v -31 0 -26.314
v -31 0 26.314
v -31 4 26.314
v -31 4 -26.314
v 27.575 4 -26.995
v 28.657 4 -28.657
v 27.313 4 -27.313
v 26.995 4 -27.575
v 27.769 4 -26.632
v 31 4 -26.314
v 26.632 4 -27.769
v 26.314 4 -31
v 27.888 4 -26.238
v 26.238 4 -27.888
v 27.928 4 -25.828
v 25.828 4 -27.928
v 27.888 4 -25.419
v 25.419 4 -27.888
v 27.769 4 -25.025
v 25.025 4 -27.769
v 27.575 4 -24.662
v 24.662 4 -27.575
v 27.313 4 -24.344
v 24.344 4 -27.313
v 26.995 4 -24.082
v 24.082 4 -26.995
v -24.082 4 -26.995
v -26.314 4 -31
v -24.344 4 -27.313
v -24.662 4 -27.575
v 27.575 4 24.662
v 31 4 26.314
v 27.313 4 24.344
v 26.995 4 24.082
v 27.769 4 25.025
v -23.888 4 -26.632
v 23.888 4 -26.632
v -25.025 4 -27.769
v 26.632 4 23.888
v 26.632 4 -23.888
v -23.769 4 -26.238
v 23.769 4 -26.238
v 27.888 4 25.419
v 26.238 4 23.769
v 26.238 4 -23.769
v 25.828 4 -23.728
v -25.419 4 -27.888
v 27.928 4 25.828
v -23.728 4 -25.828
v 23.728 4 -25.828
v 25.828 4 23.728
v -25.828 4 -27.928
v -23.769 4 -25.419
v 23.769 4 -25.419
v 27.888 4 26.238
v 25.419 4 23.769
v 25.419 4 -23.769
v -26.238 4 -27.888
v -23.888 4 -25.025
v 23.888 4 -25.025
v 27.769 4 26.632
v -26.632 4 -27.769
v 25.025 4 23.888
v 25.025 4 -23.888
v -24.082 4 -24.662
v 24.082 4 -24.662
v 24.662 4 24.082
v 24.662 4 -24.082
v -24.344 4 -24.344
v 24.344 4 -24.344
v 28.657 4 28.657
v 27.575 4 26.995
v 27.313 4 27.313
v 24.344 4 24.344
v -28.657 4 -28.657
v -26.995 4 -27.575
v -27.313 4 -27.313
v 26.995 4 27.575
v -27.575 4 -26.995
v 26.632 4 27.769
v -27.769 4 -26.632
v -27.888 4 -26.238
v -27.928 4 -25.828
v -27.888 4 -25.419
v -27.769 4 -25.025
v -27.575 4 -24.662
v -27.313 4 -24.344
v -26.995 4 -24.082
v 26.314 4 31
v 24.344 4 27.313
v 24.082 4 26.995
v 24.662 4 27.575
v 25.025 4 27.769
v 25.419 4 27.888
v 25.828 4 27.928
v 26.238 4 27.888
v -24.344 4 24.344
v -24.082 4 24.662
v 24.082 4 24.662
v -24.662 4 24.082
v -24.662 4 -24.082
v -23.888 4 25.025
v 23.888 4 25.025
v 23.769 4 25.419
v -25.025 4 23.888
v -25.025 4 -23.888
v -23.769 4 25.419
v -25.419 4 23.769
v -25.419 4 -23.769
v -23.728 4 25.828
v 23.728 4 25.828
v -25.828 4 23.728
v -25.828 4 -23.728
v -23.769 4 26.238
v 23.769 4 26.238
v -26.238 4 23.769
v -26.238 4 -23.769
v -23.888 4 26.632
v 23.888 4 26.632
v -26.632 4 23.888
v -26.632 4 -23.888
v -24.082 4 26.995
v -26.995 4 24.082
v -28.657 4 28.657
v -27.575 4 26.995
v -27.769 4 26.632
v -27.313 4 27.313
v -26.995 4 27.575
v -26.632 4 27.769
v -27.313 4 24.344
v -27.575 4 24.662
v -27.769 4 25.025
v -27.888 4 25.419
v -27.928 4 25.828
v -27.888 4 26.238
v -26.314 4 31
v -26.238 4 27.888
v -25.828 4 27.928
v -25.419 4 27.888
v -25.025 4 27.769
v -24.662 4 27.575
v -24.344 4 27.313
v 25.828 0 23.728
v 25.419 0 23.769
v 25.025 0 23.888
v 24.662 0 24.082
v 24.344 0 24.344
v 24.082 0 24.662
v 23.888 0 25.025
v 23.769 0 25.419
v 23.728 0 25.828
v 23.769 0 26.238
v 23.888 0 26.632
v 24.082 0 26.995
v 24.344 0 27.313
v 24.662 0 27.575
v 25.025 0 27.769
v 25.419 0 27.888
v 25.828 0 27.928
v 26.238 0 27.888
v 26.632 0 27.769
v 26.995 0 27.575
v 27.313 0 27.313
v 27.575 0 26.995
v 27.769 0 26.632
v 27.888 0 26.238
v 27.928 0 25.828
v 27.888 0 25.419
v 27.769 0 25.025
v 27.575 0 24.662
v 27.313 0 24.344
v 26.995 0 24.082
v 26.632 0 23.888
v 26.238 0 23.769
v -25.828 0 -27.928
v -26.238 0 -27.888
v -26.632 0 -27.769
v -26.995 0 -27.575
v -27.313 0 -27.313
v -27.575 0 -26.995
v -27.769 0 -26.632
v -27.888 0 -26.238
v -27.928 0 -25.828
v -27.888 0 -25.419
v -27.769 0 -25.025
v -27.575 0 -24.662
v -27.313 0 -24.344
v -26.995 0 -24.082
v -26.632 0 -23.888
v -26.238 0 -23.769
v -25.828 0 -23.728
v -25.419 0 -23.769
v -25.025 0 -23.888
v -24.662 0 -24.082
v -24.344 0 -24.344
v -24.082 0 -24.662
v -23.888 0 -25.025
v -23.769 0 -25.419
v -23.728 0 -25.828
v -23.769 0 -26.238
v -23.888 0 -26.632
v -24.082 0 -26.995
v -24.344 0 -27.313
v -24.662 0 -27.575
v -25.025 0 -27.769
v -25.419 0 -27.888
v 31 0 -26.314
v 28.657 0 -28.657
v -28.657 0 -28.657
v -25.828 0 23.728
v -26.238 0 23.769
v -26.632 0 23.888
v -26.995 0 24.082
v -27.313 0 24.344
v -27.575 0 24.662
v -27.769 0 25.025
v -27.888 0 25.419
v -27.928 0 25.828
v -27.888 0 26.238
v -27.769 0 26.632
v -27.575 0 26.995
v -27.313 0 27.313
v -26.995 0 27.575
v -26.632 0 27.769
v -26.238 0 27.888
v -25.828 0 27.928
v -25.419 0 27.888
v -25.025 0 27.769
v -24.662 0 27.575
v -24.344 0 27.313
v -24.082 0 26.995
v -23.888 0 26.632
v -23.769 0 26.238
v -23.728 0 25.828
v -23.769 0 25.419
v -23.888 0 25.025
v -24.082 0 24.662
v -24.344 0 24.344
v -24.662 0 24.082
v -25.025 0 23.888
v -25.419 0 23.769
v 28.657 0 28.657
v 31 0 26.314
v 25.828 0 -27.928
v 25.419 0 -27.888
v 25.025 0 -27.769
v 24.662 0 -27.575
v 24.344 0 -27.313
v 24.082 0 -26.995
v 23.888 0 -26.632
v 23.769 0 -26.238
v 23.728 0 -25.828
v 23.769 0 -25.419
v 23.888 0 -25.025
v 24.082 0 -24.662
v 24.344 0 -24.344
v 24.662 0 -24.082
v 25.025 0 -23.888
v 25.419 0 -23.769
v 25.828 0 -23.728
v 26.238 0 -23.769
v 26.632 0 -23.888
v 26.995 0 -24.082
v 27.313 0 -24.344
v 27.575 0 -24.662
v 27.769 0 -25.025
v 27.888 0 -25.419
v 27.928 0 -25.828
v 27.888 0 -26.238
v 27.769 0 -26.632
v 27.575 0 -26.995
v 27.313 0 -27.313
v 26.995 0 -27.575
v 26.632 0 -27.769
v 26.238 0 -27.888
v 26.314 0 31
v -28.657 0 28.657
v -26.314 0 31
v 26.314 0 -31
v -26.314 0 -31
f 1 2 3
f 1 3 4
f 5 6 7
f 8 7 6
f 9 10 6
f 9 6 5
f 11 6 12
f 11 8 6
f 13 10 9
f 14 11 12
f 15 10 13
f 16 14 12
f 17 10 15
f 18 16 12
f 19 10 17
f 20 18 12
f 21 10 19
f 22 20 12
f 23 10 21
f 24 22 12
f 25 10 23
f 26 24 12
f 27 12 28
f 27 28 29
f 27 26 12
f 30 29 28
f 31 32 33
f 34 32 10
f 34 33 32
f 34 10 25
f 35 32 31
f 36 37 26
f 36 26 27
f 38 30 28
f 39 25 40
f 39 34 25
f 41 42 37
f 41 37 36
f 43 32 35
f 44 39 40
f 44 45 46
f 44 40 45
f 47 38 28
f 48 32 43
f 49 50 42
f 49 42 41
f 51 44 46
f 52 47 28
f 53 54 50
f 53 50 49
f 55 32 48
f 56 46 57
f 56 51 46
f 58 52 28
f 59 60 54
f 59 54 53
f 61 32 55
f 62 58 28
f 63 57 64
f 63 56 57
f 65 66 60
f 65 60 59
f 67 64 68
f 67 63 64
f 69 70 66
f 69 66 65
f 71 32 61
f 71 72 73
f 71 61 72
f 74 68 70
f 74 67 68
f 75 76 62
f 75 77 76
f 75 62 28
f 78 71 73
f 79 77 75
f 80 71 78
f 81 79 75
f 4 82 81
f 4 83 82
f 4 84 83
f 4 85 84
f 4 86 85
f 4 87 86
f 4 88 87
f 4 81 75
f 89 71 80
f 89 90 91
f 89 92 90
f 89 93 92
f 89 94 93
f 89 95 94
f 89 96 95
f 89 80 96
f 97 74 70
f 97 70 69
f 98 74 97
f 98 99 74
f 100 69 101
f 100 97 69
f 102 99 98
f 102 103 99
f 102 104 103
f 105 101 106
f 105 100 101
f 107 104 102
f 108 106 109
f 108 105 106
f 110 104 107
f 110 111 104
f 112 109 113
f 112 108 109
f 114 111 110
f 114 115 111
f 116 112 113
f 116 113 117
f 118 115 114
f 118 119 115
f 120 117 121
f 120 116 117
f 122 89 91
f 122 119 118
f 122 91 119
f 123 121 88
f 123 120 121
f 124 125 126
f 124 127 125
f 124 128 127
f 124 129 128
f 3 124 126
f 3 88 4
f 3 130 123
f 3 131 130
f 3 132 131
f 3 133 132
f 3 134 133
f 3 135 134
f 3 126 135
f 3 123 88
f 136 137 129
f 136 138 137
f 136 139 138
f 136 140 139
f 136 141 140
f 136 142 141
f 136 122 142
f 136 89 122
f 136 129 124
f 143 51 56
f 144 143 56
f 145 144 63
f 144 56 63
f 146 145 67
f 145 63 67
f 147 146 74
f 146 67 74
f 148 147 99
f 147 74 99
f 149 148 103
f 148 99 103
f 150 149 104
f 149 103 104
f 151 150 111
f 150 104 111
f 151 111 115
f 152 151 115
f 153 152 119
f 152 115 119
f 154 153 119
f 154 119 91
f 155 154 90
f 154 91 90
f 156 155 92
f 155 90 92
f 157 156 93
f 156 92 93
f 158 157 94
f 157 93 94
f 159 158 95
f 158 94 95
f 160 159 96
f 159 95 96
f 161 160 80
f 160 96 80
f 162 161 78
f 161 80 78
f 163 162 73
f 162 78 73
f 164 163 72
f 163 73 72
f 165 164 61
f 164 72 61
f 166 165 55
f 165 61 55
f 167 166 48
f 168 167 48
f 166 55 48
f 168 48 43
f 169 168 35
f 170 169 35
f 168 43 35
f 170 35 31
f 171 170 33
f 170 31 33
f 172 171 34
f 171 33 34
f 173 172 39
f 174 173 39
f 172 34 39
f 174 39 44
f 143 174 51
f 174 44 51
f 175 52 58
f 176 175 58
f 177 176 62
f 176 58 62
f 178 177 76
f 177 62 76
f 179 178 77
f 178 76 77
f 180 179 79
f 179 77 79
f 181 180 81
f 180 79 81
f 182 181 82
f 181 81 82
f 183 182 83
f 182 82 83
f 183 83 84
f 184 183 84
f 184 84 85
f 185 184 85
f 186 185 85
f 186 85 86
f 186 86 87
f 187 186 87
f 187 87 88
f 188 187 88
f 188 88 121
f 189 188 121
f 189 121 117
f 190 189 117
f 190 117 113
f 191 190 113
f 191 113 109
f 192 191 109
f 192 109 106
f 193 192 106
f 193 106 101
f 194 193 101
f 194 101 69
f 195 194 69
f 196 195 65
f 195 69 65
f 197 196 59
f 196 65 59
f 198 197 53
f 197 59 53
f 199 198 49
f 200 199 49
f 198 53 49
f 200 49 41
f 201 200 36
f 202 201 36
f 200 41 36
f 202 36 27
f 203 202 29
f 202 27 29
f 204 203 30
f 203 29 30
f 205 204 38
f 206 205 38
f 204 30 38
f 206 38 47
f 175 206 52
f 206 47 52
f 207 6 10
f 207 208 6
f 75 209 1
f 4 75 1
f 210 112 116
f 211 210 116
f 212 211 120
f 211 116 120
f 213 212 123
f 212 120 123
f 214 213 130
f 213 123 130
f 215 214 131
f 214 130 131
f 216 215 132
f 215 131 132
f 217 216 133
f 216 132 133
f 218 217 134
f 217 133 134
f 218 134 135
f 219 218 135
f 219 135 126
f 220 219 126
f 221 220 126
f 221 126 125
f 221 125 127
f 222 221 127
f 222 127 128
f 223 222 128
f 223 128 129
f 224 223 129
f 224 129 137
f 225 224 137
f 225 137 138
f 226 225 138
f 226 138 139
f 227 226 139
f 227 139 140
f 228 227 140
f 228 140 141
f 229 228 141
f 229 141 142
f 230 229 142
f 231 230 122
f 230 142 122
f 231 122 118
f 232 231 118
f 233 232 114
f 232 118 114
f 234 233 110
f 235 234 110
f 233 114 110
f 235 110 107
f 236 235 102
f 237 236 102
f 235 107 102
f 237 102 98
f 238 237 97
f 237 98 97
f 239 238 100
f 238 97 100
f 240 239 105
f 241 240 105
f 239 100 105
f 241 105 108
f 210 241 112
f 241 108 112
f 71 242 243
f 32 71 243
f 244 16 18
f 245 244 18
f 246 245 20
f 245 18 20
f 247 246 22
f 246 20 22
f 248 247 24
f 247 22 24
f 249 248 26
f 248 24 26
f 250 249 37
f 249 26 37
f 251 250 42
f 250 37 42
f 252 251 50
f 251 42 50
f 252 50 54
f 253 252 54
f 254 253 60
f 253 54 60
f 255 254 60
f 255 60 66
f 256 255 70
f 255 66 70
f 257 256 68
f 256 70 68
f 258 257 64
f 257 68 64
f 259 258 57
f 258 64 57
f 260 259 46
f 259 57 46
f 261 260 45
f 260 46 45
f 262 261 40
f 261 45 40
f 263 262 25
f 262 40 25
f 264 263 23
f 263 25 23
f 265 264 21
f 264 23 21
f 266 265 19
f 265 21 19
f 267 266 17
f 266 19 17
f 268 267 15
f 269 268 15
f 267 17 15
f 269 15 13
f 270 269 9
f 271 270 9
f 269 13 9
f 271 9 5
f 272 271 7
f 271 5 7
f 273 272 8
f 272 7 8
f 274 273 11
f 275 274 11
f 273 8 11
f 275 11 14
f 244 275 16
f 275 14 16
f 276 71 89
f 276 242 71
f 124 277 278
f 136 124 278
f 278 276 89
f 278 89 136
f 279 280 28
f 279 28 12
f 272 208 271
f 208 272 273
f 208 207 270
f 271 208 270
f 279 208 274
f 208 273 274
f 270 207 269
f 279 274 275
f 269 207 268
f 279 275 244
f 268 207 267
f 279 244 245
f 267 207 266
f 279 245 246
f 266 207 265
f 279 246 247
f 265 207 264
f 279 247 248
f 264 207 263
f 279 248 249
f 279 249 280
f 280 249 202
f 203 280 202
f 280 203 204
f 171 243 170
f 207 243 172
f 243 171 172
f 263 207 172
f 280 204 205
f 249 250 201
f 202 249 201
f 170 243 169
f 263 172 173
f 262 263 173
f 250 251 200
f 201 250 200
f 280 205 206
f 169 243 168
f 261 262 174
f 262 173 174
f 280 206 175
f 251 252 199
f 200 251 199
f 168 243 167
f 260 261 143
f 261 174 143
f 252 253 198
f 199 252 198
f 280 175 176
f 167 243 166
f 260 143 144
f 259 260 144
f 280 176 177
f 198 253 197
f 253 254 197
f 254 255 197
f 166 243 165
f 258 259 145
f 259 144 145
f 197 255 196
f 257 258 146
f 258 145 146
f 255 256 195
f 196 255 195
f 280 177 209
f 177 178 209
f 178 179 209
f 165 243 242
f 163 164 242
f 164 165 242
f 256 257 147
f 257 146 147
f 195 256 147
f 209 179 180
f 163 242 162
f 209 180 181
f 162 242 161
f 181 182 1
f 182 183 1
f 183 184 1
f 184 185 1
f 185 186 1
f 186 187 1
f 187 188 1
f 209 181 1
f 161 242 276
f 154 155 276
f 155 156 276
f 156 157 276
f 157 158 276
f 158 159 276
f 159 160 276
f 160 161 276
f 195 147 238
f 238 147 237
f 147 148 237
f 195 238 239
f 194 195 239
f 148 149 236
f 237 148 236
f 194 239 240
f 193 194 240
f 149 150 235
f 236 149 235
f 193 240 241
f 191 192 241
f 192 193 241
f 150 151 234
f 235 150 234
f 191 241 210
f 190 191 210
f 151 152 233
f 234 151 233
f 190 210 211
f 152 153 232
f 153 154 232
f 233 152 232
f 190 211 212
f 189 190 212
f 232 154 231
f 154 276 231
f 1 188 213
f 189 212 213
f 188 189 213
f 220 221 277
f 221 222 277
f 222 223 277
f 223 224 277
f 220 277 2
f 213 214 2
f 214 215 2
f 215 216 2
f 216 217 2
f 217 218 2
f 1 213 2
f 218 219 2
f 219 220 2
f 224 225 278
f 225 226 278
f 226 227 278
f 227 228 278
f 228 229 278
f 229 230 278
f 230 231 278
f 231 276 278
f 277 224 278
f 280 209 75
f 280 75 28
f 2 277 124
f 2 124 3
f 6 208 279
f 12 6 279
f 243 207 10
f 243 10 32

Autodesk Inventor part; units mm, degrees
ref_plane "YZ Plane" through (0, 0, 0) normal (1, 0, 0) x (0, 1, 0)
ref_plane "XZ Plane" through (0, 0, 0) normal (0, 1, 0) x (-1, 0, 0)
ref_plane "XY Plane" through (0, 0, 0) normal (0, 0, 1) x (1, 0, 0)
sketch "Sketch1" plane through (0, 0, 0) normal (0, 1, 0) x (-1, 0, 0)
  line L0 (25.8285, 25.8285) -> (-25.8285, 25.8285) construction
  line L1 (-25.8285, 25.8285) -> (-25.8285, -25.8285) construction
  line L2 (-25.8285, -25.8285) -> (25.8285, -25.8285) construction
  line L3 (25.8285, -25.8285) -> (25.8285, 25.8285) construction
  line L4 (25.8285, 25.8285) -> (-25.8285, -25.8285) construction
  line L5 (-25.8285, 25.8285) -> (25.8285, -25.8285) construction
  line L6 (31, 26.3139) -> (31, -26.3139)
  line L7 (25.8285, -25.8285) -> (28.6569, -28.6569) construction
  line L8 (28.6569, -28.6569) -> (31, -26.3139)
  line L9 (0, 0) -> (14.4135, 0) construction
  line L10 (25.8285, 25.8285) -> (28.6569, 28.6569) construction
  line L11 (28.6569, 28.6569) -> (31, 26.3139)
  line L12 (-26.3139, 31) -> (26.3139, 31)
  line L13 (28.6569, 28.6569) -> (26.3139, 31)
  line L14 (-28.6569, 28.6569) -> (-26.3139, 31)
  line L15 (-31, -26.3139) -> (-31, 26.3139)
  line L16 (-28.6569, 28.6569) -> (-31, 26.3139)
  line L17 (-28.6569, -28.6569) -> (-31, -26.3139)
  line L18 (26.3139, -31) -> (-26.3139, -31)
  line L19 (-28.6569, -28.6569) -> (-26.3139, -31)
  line L20 (28.6569, -28.6569) -> (26.3139, -31)
  dimension "d0" = 51.657
  dimension "d1" = 51.657
  dimension "d4" = 31
  dimension "d5" = 4
  dimension "d8" = 360
extrude "Extrusion1" add sketch "Sketch1" along normal blind 4
hole "Hole1" at (-25.8285, 0, 25.8285) at (-25.8285, 0, -25.8285) at (25.8285, 0, 25.8285) at (25.8285, 0, -25.8285) direction (0, 1, 0) diameter 4.2 end through all
properties part number "top"
